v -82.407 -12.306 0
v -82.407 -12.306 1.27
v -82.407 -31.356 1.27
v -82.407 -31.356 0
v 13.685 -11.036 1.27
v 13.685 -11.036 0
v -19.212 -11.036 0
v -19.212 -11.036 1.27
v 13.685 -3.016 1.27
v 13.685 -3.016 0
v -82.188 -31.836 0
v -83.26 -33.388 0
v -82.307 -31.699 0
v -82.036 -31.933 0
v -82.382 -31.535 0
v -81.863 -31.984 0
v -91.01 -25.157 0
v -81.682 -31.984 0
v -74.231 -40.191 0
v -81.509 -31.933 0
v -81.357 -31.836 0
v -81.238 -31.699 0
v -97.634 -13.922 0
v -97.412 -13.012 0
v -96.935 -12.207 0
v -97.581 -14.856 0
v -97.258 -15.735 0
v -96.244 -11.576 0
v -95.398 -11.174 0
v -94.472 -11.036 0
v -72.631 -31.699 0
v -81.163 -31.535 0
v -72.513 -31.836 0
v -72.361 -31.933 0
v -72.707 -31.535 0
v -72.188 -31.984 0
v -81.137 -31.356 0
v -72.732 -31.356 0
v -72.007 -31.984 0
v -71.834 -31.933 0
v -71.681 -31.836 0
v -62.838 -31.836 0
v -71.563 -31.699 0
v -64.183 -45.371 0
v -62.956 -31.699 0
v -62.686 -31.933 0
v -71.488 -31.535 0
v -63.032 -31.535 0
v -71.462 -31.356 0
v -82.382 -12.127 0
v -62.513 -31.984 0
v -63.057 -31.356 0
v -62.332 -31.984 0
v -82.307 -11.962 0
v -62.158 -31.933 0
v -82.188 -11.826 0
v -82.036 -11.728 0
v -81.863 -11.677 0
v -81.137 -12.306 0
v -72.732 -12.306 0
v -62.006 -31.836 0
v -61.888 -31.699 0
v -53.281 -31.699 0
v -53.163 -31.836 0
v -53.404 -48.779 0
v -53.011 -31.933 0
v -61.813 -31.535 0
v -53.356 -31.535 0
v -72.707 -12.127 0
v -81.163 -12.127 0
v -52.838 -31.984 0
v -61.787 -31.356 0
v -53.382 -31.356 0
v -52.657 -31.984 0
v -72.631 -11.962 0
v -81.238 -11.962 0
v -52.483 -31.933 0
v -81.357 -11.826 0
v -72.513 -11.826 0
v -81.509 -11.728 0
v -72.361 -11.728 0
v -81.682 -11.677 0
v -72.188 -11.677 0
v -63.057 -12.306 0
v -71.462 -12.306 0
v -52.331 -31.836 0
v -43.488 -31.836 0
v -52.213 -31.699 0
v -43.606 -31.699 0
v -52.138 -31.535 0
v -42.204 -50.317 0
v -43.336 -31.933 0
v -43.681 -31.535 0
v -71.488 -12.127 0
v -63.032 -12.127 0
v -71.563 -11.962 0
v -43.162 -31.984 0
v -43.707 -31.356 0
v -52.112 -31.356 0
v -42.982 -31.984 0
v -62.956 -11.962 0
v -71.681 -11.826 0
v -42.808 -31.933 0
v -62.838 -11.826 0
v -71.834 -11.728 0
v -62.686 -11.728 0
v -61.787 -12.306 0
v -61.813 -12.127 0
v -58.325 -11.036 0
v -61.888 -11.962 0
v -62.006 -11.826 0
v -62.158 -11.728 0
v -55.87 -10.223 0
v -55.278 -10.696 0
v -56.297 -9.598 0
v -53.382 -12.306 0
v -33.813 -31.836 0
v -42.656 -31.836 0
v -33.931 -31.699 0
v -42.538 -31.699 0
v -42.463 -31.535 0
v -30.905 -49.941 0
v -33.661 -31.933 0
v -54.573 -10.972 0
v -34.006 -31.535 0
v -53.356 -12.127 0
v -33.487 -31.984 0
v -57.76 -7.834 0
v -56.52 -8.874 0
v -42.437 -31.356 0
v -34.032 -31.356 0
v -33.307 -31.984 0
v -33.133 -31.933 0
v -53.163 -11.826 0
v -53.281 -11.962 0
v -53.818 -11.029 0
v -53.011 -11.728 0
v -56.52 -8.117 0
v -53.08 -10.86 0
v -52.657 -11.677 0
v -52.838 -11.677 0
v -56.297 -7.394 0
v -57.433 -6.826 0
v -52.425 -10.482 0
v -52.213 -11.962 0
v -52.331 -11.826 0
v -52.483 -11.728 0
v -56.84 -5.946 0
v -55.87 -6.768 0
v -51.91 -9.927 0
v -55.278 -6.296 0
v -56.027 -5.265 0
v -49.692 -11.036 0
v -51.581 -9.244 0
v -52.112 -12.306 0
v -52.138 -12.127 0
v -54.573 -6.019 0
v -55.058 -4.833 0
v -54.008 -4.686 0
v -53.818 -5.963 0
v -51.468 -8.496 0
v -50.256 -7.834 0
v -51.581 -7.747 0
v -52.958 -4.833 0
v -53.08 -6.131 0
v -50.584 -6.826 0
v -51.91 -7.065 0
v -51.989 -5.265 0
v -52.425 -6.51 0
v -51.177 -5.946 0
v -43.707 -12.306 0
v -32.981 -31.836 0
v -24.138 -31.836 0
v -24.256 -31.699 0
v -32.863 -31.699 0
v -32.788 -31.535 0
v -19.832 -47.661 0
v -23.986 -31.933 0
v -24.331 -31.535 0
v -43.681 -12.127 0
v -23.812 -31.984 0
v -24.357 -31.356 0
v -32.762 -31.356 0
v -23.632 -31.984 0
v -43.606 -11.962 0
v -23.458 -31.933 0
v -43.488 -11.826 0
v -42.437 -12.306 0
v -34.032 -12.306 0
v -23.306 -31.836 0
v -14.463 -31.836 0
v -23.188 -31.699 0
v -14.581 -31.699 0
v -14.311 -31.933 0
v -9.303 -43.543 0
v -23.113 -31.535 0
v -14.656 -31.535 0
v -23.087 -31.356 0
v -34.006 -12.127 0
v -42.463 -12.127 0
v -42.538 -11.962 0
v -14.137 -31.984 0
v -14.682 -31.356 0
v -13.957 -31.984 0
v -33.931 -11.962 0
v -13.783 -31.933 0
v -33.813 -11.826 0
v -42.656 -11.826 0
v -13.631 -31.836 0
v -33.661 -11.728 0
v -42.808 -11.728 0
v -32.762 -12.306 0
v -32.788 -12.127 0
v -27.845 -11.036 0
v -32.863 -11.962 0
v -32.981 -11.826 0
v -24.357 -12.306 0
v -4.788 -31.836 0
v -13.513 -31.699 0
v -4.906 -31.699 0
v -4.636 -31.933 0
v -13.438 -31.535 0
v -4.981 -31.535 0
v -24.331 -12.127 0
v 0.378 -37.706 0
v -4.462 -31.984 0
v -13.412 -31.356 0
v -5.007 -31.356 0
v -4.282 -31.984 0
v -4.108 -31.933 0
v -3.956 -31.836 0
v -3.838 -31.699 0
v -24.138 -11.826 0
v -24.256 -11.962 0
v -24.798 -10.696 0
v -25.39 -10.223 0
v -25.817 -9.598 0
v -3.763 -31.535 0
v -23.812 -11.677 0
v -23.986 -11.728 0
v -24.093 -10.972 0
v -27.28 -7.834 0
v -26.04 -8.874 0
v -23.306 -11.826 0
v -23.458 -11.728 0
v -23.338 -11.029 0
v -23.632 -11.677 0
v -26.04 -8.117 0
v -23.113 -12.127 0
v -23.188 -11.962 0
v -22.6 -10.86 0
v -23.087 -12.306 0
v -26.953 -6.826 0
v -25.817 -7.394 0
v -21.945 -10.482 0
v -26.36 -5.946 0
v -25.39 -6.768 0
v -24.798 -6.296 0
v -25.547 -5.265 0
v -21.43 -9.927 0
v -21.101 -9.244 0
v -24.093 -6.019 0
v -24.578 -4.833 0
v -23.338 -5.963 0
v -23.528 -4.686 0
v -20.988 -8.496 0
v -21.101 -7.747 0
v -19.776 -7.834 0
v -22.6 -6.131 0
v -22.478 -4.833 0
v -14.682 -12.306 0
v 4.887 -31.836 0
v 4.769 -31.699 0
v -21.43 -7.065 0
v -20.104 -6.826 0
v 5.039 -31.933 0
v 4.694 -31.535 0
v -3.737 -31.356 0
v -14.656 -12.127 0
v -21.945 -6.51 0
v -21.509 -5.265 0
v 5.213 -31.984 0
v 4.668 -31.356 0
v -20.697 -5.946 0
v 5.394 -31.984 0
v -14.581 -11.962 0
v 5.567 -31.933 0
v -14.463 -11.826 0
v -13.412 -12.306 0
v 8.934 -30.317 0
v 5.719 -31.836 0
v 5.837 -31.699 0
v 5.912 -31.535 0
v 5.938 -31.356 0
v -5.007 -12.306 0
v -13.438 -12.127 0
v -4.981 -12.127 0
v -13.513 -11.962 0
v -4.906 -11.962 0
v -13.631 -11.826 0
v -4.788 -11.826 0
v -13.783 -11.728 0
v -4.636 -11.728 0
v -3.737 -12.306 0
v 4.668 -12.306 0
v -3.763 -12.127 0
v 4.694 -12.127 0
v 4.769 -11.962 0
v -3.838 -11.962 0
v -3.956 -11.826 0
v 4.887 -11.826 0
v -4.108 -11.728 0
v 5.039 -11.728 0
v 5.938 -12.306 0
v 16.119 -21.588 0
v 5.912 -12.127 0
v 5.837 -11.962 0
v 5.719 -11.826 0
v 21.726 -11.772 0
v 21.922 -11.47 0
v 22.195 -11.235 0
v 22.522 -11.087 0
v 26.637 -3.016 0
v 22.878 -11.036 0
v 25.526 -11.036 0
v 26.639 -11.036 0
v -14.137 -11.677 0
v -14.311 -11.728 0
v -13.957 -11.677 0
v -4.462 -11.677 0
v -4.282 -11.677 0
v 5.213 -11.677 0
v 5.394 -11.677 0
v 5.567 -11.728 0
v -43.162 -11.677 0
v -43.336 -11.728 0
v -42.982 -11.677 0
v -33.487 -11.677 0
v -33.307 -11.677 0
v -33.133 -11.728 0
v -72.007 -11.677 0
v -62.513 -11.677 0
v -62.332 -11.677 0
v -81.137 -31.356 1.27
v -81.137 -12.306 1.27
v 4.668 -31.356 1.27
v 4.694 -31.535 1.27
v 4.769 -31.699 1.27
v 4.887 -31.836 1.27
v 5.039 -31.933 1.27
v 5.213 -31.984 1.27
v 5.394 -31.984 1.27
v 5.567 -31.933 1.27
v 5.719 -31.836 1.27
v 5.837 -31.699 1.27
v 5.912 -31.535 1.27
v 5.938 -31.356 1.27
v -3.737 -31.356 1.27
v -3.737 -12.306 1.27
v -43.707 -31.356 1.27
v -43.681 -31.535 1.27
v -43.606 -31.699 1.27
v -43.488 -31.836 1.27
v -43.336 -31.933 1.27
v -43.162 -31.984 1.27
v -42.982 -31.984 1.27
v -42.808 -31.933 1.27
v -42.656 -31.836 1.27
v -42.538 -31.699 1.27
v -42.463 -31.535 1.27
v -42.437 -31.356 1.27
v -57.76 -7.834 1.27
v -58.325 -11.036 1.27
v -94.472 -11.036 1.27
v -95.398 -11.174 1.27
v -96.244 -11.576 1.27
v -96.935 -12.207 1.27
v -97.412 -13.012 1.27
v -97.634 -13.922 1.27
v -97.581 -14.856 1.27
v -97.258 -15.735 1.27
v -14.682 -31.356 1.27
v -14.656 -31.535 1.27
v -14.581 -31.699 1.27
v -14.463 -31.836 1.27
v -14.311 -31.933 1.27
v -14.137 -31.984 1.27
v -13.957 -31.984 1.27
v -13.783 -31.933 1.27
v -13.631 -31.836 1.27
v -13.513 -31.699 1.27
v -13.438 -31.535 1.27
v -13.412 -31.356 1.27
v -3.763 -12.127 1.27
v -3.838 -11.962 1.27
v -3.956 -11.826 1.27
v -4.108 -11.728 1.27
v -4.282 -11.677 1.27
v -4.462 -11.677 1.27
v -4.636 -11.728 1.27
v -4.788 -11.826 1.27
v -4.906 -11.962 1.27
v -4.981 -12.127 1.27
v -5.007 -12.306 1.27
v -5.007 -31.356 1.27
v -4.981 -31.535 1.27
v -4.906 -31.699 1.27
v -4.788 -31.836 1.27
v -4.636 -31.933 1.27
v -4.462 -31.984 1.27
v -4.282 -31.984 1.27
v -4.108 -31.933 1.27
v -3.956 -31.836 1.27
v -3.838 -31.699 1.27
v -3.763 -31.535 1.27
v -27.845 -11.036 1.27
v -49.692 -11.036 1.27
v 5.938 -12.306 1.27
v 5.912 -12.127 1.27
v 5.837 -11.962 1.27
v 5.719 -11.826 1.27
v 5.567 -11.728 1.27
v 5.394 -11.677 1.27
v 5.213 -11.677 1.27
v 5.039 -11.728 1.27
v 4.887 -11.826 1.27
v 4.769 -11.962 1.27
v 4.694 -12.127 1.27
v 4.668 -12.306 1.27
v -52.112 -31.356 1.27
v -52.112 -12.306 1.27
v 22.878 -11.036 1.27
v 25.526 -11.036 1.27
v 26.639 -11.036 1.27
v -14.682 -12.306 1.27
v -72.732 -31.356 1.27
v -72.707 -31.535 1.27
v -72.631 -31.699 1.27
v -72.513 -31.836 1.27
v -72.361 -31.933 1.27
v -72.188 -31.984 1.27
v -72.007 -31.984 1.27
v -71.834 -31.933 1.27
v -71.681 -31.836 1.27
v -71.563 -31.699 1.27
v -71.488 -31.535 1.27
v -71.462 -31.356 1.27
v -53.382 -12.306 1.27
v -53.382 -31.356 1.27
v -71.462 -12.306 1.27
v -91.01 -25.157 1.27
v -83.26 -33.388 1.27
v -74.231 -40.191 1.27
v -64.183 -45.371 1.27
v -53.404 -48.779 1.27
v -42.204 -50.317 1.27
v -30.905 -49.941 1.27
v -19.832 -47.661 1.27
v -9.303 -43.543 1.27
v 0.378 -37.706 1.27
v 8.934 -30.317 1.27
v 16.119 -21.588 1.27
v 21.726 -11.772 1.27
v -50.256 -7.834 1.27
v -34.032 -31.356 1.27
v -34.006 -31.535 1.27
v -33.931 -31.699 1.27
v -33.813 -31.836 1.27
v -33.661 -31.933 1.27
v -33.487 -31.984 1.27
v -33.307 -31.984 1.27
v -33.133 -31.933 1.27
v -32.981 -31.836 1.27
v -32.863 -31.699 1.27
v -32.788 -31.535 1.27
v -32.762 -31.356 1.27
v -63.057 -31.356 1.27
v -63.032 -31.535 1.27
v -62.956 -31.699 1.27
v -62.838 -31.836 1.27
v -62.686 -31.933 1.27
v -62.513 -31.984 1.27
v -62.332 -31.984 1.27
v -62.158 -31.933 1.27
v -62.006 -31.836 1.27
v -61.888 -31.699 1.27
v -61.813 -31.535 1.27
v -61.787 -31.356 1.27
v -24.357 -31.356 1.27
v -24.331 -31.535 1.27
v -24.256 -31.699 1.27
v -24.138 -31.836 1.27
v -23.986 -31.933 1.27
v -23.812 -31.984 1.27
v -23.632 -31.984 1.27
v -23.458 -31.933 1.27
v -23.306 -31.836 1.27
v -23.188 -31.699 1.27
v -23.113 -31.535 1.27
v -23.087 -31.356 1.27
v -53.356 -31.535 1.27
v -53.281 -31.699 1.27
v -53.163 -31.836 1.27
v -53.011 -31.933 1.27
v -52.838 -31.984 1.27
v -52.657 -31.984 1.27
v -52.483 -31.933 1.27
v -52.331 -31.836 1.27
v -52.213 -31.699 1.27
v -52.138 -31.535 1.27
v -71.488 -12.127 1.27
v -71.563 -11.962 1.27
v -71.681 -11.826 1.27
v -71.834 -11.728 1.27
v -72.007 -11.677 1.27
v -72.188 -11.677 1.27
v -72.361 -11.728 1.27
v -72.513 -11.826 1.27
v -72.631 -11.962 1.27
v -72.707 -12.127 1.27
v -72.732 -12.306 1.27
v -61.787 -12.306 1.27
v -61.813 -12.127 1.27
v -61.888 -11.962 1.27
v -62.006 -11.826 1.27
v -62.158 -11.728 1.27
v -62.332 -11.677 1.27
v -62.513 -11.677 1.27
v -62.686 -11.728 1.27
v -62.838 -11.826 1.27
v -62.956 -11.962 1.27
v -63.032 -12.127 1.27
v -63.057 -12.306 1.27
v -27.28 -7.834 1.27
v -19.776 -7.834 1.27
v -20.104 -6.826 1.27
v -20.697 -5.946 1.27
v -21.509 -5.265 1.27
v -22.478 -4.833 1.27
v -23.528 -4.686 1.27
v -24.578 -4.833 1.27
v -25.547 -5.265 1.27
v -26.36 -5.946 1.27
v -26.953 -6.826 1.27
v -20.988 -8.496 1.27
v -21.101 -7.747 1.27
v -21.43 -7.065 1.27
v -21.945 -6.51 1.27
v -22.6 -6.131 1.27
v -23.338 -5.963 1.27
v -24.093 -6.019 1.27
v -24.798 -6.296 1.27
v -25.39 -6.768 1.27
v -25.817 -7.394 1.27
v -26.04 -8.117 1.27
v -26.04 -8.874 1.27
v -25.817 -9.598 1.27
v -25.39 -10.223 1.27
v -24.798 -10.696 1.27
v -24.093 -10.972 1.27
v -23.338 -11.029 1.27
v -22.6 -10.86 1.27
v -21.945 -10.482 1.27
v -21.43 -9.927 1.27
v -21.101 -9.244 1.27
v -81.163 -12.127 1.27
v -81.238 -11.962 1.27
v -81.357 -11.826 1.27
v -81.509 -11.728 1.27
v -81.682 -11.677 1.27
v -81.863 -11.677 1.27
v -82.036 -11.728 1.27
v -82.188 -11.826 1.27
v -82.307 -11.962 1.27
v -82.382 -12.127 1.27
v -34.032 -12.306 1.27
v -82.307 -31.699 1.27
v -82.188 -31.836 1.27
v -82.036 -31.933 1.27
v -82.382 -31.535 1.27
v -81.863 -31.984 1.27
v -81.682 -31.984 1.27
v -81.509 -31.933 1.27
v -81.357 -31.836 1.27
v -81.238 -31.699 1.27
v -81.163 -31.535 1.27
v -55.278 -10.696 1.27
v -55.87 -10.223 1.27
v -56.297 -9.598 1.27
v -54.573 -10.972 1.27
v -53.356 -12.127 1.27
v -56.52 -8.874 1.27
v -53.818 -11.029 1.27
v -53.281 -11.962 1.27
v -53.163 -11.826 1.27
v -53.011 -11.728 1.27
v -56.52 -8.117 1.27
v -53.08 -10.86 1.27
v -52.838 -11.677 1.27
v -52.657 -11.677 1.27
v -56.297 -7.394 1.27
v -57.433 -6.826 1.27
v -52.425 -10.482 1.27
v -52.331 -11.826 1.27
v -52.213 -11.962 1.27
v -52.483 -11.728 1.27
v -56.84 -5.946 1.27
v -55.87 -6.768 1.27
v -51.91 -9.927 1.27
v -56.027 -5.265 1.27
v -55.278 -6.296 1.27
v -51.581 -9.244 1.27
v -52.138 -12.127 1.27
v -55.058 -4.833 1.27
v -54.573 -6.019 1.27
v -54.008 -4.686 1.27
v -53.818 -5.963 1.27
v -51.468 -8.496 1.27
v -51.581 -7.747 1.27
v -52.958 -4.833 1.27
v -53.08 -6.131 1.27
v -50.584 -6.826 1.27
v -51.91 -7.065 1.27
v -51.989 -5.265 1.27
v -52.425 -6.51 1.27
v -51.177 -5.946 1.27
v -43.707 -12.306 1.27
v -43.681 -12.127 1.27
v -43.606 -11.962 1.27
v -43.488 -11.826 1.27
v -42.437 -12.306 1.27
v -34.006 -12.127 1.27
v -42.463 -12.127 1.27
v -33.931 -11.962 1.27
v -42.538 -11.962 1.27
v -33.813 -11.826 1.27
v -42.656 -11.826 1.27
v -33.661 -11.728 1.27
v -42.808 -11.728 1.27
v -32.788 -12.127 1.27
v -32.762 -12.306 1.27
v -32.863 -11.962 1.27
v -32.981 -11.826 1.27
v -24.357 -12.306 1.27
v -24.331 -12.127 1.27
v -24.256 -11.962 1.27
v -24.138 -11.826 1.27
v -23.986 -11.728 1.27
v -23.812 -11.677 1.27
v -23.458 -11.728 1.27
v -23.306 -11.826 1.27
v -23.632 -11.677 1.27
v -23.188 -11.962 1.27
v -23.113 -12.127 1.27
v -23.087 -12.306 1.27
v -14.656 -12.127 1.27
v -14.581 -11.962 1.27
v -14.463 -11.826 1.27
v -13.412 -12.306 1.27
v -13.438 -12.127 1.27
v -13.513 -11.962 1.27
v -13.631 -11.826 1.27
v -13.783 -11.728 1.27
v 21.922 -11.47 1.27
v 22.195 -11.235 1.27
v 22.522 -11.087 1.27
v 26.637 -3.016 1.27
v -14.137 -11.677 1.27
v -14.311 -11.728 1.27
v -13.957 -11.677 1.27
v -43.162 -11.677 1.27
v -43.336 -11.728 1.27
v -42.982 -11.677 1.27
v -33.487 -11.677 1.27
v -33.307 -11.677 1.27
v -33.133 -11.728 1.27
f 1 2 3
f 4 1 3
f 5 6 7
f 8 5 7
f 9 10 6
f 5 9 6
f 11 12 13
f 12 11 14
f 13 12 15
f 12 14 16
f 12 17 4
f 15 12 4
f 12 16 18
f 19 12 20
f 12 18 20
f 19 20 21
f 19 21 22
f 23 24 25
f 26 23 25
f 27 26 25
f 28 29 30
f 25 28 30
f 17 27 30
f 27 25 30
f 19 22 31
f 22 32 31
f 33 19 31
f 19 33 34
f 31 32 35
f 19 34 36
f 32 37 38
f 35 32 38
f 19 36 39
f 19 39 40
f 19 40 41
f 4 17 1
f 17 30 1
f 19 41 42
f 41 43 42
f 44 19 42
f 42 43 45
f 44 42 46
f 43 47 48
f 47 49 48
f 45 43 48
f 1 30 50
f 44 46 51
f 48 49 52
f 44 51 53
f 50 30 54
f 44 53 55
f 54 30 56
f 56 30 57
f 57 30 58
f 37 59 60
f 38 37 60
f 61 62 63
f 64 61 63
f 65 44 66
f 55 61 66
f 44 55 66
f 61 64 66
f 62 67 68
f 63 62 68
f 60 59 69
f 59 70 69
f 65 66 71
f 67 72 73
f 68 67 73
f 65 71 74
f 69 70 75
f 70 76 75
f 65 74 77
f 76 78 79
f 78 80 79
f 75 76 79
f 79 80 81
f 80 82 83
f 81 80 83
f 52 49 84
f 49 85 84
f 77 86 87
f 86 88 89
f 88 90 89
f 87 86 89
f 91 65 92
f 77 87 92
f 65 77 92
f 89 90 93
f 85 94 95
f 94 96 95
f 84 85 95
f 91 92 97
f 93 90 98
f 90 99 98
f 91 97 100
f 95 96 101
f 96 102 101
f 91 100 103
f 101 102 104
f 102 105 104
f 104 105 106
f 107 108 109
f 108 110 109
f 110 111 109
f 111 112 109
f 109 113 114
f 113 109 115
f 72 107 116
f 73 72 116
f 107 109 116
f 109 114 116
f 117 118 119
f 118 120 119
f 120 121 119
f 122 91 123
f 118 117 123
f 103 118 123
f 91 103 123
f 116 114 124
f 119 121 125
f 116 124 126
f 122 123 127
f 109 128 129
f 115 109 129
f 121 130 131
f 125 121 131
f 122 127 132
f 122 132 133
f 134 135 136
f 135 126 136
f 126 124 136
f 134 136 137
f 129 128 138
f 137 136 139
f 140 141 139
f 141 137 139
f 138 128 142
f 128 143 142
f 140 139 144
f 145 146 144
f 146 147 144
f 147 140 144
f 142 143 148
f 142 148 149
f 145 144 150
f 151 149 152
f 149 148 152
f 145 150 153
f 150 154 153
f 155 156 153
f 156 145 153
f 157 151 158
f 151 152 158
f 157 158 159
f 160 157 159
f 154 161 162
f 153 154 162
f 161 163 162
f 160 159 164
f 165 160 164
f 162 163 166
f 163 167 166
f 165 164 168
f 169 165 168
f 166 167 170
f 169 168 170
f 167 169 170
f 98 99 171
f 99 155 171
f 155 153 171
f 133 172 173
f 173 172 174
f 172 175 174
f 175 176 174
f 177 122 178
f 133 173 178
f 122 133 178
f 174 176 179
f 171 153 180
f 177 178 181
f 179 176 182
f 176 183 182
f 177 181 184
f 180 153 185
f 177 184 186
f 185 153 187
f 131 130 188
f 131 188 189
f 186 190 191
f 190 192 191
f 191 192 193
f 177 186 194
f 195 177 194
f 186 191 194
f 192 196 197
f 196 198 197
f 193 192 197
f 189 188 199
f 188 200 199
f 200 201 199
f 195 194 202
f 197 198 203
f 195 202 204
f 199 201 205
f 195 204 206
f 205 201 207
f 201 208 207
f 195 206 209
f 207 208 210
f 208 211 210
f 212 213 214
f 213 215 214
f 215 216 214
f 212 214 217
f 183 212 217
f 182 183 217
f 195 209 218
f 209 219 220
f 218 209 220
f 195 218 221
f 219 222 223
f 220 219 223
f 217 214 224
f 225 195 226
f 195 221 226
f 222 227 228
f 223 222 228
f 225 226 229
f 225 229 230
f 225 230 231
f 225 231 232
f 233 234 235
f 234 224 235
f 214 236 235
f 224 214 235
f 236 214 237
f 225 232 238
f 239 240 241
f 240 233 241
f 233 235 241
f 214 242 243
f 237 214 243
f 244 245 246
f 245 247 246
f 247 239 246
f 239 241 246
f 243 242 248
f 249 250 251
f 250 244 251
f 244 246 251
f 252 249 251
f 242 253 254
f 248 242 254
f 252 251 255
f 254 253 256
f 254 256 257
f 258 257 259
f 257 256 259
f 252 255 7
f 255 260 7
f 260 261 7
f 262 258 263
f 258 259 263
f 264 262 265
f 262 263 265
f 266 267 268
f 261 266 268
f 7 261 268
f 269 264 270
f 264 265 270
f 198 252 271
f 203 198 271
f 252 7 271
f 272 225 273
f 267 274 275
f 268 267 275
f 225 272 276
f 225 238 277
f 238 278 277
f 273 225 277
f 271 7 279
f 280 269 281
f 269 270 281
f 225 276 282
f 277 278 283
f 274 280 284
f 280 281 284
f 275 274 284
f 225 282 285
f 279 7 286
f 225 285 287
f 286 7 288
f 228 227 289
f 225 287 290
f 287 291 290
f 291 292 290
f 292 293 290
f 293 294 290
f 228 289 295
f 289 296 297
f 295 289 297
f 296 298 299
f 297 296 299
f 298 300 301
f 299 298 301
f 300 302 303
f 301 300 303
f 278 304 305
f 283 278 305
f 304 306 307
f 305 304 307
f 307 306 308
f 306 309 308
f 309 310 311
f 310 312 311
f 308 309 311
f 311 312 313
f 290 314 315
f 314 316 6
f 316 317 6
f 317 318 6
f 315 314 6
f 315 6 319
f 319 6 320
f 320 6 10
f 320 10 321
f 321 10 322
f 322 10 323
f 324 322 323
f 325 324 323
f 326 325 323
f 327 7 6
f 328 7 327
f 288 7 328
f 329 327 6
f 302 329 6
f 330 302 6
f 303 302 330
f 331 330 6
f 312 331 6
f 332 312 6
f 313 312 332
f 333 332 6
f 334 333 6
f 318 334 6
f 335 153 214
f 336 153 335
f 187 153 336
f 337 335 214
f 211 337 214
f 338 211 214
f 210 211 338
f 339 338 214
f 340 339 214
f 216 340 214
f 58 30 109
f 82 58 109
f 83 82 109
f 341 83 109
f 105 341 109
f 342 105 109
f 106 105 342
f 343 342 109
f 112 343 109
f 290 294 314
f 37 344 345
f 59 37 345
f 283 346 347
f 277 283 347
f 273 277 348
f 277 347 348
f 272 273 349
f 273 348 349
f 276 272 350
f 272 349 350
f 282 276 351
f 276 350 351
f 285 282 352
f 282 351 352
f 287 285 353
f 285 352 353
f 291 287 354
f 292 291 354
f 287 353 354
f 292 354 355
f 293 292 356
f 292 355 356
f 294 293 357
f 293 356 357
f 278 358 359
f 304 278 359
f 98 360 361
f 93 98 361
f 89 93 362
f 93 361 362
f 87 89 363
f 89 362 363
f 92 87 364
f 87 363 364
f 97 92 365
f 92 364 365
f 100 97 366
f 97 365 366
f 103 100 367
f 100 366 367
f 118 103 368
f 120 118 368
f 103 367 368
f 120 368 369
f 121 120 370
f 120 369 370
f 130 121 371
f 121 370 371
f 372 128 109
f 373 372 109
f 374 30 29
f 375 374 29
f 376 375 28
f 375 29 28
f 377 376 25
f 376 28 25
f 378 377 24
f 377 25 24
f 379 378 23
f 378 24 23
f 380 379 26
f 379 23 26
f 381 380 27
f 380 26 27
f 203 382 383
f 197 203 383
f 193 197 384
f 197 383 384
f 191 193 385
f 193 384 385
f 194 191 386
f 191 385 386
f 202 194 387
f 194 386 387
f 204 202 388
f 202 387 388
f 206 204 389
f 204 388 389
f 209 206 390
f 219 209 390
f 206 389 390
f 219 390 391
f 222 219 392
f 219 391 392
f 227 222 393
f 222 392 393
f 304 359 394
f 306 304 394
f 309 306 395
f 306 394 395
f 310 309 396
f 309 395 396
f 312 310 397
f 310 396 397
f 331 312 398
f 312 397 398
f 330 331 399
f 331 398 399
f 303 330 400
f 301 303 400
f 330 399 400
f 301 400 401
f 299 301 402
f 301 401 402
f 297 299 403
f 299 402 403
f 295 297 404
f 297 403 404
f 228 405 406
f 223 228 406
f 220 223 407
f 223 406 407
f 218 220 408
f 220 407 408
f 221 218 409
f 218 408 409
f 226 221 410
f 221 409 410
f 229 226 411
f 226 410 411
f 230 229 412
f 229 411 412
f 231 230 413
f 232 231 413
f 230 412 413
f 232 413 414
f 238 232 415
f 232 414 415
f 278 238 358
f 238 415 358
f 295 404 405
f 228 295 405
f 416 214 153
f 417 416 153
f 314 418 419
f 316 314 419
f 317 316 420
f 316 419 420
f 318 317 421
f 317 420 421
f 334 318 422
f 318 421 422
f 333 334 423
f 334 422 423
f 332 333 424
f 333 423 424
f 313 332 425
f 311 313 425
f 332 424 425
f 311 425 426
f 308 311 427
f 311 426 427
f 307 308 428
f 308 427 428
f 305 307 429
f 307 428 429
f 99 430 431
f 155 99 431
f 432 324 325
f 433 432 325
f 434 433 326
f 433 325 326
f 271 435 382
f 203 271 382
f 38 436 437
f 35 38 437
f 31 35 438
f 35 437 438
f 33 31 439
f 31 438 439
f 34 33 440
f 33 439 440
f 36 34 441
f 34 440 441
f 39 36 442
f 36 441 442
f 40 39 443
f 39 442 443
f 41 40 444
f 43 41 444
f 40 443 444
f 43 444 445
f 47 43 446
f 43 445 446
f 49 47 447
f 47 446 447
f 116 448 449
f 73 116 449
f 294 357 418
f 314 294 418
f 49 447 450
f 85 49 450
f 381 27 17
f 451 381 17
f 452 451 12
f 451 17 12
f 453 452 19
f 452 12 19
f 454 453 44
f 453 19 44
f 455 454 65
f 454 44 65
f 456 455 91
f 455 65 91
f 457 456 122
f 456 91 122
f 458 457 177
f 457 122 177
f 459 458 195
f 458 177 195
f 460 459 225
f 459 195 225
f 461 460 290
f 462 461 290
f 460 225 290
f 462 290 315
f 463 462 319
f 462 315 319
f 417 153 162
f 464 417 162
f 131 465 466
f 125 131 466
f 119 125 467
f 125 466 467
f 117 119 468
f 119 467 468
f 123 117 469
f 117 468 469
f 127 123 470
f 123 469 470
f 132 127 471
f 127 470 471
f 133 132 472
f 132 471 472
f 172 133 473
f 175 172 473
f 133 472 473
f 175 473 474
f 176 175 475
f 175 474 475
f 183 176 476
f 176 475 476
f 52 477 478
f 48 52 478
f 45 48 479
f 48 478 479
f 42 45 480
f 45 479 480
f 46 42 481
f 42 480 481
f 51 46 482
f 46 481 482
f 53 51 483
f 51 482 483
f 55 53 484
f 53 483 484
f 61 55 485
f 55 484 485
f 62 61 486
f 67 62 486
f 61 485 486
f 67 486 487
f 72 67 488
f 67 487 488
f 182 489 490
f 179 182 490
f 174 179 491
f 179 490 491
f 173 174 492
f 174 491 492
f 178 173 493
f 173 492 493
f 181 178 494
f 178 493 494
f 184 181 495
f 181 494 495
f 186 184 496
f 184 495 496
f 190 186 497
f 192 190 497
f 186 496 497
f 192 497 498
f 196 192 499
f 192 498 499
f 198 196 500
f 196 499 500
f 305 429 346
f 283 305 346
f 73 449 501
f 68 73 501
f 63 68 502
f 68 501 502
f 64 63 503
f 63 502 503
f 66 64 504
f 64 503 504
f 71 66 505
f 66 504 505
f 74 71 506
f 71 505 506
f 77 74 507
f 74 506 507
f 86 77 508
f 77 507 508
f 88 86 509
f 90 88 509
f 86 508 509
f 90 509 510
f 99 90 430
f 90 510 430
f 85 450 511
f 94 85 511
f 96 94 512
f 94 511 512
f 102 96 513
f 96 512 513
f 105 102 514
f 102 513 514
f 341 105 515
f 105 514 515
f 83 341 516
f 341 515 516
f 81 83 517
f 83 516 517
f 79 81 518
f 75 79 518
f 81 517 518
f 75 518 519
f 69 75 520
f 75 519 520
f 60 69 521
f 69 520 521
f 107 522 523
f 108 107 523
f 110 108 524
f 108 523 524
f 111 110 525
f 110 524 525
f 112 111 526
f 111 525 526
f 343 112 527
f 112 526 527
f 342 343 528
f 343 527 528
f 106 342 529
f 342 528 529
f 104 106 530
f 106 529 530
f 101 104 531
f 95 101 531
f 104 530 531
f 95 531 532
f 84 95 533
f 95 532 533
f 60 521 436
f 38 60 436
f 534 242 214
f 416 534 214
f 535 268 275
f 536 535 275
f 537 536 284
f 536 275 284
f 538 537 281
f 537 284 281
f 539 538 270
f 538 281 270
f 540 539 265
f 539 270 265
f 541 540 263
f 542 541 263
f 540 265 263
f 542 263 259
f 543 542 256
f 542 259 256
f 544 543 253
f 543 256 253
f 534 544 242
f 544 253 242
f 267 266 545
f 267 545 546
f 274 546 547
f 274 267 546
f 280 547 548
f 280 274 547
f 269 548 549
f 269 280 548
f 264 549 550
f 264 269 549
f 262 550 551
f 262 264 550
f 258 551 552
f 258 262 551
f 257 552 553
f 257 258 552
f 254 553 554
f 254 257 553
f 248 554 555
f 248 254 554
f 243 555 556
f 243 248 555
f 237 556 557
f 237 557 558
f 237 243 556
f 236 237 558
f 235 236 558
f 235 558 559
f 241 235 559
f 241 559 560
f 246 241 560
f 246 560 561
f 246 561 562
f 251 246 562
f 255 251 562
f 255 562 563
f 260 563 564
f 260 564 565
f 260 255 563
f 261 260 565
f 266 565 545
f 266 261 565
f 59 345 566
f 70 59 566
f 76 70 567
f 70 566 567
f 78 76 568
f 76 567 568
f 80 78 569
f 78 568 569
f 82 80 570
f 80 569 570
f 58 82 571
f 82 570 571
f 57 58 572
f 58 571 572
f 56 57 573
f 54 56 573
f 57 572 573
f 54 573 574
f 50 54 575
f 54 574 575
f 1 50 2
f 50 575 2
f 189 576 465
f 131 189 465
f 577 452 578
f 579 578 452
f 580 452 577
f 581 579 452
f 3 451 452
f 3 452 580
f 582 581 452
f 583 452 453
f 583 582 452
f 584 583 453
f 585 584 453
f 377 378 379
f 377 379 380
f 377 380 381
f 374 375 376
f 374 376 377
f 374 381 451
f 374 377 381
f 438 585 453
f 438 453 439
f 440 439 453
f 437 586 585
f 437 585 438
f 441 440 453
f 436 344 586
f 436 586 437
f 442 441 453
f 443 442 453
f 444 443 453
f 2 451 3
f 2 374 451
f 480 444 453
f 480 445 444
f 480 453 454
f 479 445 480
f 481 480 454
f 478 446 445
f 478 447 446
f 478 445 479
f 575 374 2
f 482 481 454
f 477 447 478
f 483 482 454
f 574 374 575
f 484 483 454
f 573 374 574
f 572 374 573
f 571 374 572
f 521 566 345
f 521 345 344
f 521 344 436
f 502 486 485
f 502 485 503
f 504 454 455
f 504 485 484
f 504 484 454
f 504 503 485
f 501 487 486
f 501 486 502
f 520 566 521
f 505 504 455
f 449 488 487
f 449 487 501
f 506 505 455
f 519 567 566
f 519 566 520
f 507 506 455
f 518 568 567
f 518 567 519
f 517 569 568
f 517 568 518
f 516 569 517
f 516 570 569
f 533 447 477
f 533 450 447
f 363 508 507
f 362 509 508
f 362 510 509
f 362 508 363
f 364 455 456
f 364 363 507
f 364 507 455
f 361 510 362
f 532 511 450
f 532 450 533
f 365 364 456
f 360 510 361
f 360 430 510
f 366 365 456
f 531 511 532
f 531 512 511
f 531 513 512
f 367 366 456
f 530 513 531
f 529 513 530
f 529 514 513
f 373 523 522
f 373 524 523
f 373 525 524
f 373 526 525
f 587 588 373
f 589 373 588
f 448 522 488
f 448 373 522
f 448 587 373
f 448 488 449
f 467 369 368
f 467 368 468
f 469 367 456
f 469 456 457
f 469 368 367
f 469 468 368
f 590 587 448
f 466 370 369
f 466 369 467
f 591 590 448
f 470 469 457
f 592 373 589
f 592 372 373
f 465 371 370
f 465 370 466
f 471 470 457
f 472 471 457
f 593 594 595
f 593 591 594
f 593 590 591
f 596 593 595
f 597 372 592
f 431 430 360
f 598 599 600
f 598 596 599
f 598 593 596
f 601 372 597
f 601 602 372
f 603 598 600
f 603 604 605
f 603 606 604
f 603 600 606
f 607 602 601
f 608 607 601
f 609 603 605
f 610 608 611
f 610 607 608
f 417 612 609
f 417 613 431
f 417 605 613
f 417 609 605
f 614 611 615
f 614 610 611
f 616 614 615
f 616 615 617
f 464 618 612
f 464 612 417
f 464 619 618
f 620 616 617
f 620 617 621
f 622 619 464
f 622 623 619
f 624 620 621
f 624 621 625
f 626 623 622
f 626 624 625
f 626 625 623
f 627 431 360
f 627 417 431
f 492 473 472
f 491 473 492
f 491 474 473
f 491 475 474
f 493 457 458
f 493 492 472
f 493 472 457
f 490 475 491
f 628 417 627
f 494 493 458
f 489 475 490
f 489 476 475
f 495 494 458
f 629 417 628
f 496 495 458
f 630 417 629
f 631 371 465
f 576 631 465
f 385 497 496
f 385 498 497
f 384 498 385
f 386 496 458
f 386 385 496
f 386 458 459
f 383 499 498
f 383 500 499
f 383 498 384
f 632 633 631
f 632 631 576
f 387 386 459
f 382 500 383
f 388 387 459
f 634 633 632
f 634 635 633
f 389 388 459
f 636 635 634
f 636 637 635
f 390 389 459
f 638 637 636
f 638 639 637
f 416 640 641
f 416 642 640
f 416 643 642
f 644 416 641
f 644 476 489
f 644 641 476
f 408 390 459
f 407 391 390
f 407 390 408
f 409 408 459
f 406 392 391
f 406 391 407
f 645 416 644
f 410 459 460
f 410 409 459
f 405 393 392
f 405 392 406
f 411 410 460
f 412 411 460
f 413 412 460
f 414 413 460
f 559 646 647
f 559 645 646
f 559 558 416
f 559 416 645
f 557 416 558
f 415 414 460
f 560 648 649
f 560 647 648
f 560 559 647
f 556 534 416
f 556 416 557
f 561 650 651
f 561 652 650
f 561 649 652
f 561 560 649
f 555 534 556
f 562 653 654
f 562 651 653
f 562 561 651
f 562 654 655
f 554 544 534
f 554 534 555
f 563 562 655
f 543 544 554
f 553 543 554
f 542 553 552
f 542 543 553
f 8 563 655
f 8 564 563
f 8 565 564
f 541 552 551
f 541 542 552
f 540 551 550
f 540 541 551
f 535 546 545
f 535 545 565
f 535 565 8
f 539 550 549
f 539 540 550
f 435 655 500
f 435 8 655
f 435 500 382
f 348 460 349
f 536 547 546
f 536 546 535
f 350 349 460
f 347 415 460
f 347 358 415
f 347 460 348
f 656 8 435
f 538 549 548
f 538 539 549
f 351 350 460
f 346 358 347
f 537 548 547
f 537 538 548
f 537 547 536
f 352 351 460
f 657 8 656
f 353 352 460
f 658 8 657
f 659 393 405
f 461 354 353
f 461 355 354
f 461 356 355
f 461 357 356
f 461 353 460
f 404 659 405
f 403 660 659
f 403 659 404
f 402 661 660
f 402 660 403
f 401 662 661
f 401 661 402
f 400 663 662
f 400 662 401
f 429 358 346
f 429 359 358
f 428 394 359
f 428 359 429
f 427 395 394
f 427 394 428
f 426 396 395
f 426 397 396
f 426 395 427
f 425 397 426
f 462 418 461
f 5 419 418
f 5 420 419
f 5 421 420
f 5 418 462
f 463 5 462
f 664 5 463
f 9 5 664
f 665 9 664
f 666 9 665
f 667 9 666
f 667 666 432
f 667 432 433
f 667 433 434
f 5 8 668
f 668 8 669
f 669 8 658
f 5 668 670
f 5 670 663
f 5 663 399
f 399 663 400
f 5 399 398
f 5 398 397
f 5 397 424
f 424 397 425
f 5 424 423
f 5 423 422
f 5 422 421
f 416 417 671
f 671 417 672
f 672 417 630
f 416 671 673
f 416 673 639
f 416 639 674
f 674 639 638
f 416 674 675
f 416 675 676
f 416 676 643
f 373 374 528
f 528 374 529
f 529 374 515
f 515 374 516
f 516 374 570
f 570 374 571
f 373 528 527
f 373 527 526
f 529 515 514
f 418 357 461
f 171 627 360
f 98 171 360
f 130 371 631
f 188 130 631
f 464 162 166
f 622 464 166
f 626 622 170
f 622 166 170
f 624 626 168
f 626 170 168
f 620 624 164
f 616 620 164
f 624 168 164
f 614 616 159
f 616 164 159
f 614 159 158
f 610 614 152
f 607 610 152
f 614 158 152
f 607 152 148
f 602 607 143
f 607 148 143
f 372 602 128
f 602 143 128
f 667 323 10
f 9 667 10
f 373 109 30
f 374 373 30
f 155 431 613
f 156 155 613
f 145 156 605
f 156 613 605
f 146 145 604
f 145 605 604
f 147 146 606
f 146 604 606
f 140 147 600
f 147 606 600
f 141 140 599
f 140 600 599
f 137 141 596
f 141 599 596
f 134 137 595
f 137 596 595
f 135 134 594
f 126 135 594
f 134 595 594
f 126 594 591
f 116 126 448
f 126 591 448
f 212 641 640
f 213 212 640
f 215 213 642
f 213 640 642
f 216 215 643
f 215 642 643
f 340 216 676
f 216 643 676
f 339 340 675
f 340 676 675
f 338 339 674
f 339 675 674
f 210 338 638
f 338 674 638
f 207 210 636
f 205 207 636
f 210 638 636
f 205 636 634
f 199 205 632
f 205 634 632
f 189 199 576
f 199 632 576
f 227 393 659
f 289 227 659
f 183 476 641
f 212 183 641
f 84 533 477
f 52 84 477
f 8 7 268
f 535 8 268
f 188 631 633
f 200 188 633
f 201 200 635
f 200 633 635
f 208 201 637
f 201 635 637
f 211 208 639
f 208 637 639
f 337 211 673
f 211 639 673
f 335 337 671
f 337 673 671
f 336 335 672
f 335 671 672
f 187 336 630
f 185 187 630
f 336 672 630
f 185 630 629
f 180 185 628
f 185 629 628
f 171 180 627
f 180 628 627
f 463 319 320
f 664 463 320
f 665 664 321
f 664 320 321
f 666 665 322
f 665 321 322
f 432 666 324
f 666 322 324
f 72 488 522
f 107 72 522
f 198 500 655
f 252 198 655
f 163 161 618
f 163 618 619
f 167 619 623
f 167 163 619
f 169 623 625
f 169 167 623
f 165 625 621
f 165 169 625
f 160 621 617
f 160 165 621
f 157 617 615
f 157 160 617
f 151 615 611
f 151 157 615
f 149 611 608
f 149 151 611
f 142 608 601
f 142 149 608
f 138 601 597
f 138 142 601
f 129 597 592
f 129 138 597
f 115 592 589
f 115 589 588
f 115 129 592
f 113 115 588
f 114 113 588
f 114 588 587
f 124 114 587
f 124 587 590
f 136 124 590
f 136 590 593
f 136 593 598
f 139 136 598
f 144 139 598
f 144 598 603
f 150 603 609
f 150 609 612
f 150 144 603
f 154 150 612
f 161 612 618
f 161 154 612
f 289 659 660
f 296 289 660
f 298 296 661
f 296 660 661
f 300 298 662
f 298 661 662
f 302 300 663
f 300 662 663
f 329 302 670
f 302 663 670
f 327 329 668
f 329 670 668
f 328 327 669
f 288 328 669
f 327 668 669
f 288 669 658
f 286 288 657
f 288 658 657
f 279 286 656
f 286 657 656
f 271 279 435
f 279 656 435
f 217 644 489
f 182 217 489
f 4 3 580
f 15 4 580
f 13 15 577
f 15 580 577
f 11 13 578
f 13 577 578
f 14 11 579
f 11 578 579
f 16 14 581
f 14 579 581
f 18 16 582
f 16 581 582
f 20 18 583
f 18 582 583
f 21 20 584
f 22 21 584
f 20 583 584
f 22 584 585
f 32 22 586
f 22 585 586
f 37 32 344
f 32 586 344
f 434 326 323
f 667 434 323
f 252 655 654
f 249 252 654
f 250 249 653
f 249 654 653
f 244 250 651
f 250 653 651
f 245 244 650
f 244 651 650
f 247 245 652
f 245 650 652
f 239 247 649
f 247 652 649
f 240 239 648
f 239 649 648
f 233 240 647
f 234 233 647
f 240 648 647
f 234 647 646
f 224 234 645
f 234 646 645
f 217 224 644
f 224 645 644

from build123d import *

# Parameters (mm, degrees)
F0_R     = 2.54
F1_DEPTH = 1.27
F3_DEPTH = 25.4


with BuildPart() as f1:
    # F0 (on Top) → F1 (new body)
    with BuildSketch(Plane.XY):
        with BuildLine():
            ThreePointArc((-94.472359, -11.035805), (-97.203597, -12.591866), (-97.257687, -15.734805))
            ThreePointArc((-97.257687, -15.734805), (-36.546229, -50.36885), (21.726042, -11.771693))
            ThreePointArc((21.726042, -11.771693), (22.194683, -11.235473), (22.878268, -11.035805))
            Line((22.878268, -11.035805), (25.526176, -11.035805))
            add(Edge.make_bspline(
                [(26.63919, -11.035805), (26.515522, -11.035805), (26.268185, -11.035805), (25.897181, -11.035805), (25.649844, -11.035805), (25.526176, -11.035805)],
                knots=[0, 0, 0, 0, 0.371005, 0.742009, 1.113014, 1.113014, 1.113014, 1.113014], degree=3))
            Line((26.63919, -11.035805), (26.636754, -3.015521))
            Line((26.636754, -3.015521), (15.20919, -3.015521))
            Line((15.20919, -3.015521), (15.206754, -3.015521))
            Line((15.206754, -3.015521), (13.68519, -3.015521))
            Line((13.68519, -3.015521), (13.68519, -11.035805))
            Line((13.68519, -11.035805), (-19.2116, -11.035805))
            Line((-19.2116, -11.035805), (-19.776128, -7.834206))
            ThreePointArc((-19.776128, -7.834206), (-23.528246, -4.685805), (-27.280363, -7.834206))
            Line((-27.280363, -7.834206), (-27.844892, -11.035805))
            Line((-27.844892, -11.035805), (-33.688246, -11.035805))
            Line((-33.688246, -11.035805), (-49.6916, -11.035805))
            Line((-49.6916, -11.035805), (-50.256128, -7.834206))
            ThreePointArc((-50.256128, -7.834206), (-54.008246, -4.685805), (-57.760363, -7.834206))
            Line((-57.760363, -7.834206), (-58.324892, -11.035805))
            Line((-58.324892, -11.035805), (-64.168246, -11.035805))
            Line((-64.168246, -11.035805), (-94.472359, -11.035805))
        make_face()
        with Locations((-54.008246, -8.495805)):
            Circle(F0_R, mode=Mode.SUBTRACT)
        with Locations((-23.528246, -8.495805)):
            Circle(F0_R, mode=Mode.SUBTRACT)
    extrude(amount=F1_DEPTH)

    # F2 (on face) → F3 (cut)
    with BuildSketch(Plane.XY.offset(1.27)):
        with BuildLine():
            ThreePointArc((-81.137359, -12.305805), (-81.772359, -11.670805), (-82.407359, -12.305805))
            Line((-82.407359, -12.305805), (-82.407359, -31.355805))
            ThreePointArc((-82.407359, -31.355805), (-81.772359, -31.990805), (-81.137359, -31.355805))
            Line((-81.137359, -31.355805), (-81.137359, -12.305805))
        make_face()
        with BuildLine():
            ThreePointArc((-71.462298, -12.305805), (-72.097298, -11.670805), (-72.732298, -12.305805))
            Line((-72.732298, -12.305805), (-72.732298, -31.355805))
            ThreePointArc((-72.732298, -31.355805), (-72.097298, -31.990805), (-71.462298, -31.355805))
            Line((-71.462298, -31.355805), (-71.462298, -12.305805))
        make_face()
        with BuildLine():
            ThreePointArc((-61.787237, -12.305805), (-62.422237, -11.670805), (-63.057237, -12.305805))
            Line((-63.057237, -12.305805), (-63.057237, -31.355805))
            ThreePointArc((-63.057237, -31.355805), (-62.422237, -31.990805), (-61.787237, -31.355805))
            Line((-61.787237, -31.355805), (-61.787237, -12.305805))
        make_face()
        with BuildLine():
            ThreePointArc((-52.112176, -12.305805), (-52.747176, -11.670805), (-53.382176, -12.305805))
            Line((-53.382176, -12.305805), (-53.382176, -31.355805))
            ThreePointArc((-53.382176, -31.355805), (-52.747176, -31.990805), (-52.112176, -31.355805))
            Line((-52.112176, -31.355805), (-52.112176, -12.305805))
        make_face()
        with BuildLine():
            ThreePointArc((-42.437115, -12.305805), (-43.072115, -11.670805), (-43.707115, -12.305805))
            Line((-43.707115, -12.305805), (-43.707115, -31.355805))
            ThreePointArc((-43.707115, -31.355805), (-43.072115, -31.990805), (-42.437115, -31.355805))
            Line((-42.437115, -31.355805), (-42.437115, -12.305805))
        make_face()
        with BuildLine():
            ThreePointArc((-32.762054, -12.305805), (-33.397054, -11.670805), (-34.032054, -12.305805))
            Line((-34.032054, -12.305805), (-34.032054, -31.355805))
            ThreePointArc((-34.032054, -31.355805), (-33.397054, -31.990805), (-32.762054, -31.355805))
            Line((-32.762054, -31.355805), (-32.762054, -12.305805))
        make_face()
        with BuildLine():
            ThreePointArc((-23.086993, -12.305805), (-23.721993, -11.670805), (-24.356993, -12.305805))
            Line((-24.356993, -12.305805), (-24.356993, -31.355805))
            ThreePointArc((-24.356993, -31.355805), (-23.721993, -31.990805), (-23.086993, -31.355805))
            Line((-23.086993, -31.355805), (-23.086993, -12.305805))
        make_face()
        with BuildLine():
            ThreePointArc((-13.411932, -12.305805), (-14.046932, -11.670805), (-14.681932, -12.305805))
            Line((-14.681932, -12.305805), (-14.681932, -31.355805))
            ThreePointArc((-14.681932, -31.355805), (-14.046932, -31.990805), (-13.411932, -31.355805))
            Line((-13.411932, -31.355805), (-13.411932, -12.305805))
        make_face()
        with BuildLine():
            ThreePointArc((-3.736871, -12.305805), (-4.371871, -11.670805), (-5.006871, -12.305805))
            Line((-5.006871, -12.305805), (-5.006871, -31.355805))
            ThreePointArc((-5.006871, -31.355805), (-4.371871, -31.990805), (-3.736871, -31.355805))
            Line((-3.736871, -31.355805), (-3.736871, -12.305805))
        make_face()
        with BuildLine():
            ThreePointArc((5.93819, -12.305805), (5.30319, -11.670805), (4.66819, -12.305805))
            Line((4.66819, -12.305805), (4.66819, -31.355805))
            ThreePointArc((4.66819, -31.355805), (5.30319, -31.990805), (5.93819, -31.355805))
            Line((5.93819, -31.355805), (5.93819, -12.305805))
        make_face()
    extrude(amount=-F3_DEPTH, mode=Mode.SUBTRACT)


solid = f1.part
